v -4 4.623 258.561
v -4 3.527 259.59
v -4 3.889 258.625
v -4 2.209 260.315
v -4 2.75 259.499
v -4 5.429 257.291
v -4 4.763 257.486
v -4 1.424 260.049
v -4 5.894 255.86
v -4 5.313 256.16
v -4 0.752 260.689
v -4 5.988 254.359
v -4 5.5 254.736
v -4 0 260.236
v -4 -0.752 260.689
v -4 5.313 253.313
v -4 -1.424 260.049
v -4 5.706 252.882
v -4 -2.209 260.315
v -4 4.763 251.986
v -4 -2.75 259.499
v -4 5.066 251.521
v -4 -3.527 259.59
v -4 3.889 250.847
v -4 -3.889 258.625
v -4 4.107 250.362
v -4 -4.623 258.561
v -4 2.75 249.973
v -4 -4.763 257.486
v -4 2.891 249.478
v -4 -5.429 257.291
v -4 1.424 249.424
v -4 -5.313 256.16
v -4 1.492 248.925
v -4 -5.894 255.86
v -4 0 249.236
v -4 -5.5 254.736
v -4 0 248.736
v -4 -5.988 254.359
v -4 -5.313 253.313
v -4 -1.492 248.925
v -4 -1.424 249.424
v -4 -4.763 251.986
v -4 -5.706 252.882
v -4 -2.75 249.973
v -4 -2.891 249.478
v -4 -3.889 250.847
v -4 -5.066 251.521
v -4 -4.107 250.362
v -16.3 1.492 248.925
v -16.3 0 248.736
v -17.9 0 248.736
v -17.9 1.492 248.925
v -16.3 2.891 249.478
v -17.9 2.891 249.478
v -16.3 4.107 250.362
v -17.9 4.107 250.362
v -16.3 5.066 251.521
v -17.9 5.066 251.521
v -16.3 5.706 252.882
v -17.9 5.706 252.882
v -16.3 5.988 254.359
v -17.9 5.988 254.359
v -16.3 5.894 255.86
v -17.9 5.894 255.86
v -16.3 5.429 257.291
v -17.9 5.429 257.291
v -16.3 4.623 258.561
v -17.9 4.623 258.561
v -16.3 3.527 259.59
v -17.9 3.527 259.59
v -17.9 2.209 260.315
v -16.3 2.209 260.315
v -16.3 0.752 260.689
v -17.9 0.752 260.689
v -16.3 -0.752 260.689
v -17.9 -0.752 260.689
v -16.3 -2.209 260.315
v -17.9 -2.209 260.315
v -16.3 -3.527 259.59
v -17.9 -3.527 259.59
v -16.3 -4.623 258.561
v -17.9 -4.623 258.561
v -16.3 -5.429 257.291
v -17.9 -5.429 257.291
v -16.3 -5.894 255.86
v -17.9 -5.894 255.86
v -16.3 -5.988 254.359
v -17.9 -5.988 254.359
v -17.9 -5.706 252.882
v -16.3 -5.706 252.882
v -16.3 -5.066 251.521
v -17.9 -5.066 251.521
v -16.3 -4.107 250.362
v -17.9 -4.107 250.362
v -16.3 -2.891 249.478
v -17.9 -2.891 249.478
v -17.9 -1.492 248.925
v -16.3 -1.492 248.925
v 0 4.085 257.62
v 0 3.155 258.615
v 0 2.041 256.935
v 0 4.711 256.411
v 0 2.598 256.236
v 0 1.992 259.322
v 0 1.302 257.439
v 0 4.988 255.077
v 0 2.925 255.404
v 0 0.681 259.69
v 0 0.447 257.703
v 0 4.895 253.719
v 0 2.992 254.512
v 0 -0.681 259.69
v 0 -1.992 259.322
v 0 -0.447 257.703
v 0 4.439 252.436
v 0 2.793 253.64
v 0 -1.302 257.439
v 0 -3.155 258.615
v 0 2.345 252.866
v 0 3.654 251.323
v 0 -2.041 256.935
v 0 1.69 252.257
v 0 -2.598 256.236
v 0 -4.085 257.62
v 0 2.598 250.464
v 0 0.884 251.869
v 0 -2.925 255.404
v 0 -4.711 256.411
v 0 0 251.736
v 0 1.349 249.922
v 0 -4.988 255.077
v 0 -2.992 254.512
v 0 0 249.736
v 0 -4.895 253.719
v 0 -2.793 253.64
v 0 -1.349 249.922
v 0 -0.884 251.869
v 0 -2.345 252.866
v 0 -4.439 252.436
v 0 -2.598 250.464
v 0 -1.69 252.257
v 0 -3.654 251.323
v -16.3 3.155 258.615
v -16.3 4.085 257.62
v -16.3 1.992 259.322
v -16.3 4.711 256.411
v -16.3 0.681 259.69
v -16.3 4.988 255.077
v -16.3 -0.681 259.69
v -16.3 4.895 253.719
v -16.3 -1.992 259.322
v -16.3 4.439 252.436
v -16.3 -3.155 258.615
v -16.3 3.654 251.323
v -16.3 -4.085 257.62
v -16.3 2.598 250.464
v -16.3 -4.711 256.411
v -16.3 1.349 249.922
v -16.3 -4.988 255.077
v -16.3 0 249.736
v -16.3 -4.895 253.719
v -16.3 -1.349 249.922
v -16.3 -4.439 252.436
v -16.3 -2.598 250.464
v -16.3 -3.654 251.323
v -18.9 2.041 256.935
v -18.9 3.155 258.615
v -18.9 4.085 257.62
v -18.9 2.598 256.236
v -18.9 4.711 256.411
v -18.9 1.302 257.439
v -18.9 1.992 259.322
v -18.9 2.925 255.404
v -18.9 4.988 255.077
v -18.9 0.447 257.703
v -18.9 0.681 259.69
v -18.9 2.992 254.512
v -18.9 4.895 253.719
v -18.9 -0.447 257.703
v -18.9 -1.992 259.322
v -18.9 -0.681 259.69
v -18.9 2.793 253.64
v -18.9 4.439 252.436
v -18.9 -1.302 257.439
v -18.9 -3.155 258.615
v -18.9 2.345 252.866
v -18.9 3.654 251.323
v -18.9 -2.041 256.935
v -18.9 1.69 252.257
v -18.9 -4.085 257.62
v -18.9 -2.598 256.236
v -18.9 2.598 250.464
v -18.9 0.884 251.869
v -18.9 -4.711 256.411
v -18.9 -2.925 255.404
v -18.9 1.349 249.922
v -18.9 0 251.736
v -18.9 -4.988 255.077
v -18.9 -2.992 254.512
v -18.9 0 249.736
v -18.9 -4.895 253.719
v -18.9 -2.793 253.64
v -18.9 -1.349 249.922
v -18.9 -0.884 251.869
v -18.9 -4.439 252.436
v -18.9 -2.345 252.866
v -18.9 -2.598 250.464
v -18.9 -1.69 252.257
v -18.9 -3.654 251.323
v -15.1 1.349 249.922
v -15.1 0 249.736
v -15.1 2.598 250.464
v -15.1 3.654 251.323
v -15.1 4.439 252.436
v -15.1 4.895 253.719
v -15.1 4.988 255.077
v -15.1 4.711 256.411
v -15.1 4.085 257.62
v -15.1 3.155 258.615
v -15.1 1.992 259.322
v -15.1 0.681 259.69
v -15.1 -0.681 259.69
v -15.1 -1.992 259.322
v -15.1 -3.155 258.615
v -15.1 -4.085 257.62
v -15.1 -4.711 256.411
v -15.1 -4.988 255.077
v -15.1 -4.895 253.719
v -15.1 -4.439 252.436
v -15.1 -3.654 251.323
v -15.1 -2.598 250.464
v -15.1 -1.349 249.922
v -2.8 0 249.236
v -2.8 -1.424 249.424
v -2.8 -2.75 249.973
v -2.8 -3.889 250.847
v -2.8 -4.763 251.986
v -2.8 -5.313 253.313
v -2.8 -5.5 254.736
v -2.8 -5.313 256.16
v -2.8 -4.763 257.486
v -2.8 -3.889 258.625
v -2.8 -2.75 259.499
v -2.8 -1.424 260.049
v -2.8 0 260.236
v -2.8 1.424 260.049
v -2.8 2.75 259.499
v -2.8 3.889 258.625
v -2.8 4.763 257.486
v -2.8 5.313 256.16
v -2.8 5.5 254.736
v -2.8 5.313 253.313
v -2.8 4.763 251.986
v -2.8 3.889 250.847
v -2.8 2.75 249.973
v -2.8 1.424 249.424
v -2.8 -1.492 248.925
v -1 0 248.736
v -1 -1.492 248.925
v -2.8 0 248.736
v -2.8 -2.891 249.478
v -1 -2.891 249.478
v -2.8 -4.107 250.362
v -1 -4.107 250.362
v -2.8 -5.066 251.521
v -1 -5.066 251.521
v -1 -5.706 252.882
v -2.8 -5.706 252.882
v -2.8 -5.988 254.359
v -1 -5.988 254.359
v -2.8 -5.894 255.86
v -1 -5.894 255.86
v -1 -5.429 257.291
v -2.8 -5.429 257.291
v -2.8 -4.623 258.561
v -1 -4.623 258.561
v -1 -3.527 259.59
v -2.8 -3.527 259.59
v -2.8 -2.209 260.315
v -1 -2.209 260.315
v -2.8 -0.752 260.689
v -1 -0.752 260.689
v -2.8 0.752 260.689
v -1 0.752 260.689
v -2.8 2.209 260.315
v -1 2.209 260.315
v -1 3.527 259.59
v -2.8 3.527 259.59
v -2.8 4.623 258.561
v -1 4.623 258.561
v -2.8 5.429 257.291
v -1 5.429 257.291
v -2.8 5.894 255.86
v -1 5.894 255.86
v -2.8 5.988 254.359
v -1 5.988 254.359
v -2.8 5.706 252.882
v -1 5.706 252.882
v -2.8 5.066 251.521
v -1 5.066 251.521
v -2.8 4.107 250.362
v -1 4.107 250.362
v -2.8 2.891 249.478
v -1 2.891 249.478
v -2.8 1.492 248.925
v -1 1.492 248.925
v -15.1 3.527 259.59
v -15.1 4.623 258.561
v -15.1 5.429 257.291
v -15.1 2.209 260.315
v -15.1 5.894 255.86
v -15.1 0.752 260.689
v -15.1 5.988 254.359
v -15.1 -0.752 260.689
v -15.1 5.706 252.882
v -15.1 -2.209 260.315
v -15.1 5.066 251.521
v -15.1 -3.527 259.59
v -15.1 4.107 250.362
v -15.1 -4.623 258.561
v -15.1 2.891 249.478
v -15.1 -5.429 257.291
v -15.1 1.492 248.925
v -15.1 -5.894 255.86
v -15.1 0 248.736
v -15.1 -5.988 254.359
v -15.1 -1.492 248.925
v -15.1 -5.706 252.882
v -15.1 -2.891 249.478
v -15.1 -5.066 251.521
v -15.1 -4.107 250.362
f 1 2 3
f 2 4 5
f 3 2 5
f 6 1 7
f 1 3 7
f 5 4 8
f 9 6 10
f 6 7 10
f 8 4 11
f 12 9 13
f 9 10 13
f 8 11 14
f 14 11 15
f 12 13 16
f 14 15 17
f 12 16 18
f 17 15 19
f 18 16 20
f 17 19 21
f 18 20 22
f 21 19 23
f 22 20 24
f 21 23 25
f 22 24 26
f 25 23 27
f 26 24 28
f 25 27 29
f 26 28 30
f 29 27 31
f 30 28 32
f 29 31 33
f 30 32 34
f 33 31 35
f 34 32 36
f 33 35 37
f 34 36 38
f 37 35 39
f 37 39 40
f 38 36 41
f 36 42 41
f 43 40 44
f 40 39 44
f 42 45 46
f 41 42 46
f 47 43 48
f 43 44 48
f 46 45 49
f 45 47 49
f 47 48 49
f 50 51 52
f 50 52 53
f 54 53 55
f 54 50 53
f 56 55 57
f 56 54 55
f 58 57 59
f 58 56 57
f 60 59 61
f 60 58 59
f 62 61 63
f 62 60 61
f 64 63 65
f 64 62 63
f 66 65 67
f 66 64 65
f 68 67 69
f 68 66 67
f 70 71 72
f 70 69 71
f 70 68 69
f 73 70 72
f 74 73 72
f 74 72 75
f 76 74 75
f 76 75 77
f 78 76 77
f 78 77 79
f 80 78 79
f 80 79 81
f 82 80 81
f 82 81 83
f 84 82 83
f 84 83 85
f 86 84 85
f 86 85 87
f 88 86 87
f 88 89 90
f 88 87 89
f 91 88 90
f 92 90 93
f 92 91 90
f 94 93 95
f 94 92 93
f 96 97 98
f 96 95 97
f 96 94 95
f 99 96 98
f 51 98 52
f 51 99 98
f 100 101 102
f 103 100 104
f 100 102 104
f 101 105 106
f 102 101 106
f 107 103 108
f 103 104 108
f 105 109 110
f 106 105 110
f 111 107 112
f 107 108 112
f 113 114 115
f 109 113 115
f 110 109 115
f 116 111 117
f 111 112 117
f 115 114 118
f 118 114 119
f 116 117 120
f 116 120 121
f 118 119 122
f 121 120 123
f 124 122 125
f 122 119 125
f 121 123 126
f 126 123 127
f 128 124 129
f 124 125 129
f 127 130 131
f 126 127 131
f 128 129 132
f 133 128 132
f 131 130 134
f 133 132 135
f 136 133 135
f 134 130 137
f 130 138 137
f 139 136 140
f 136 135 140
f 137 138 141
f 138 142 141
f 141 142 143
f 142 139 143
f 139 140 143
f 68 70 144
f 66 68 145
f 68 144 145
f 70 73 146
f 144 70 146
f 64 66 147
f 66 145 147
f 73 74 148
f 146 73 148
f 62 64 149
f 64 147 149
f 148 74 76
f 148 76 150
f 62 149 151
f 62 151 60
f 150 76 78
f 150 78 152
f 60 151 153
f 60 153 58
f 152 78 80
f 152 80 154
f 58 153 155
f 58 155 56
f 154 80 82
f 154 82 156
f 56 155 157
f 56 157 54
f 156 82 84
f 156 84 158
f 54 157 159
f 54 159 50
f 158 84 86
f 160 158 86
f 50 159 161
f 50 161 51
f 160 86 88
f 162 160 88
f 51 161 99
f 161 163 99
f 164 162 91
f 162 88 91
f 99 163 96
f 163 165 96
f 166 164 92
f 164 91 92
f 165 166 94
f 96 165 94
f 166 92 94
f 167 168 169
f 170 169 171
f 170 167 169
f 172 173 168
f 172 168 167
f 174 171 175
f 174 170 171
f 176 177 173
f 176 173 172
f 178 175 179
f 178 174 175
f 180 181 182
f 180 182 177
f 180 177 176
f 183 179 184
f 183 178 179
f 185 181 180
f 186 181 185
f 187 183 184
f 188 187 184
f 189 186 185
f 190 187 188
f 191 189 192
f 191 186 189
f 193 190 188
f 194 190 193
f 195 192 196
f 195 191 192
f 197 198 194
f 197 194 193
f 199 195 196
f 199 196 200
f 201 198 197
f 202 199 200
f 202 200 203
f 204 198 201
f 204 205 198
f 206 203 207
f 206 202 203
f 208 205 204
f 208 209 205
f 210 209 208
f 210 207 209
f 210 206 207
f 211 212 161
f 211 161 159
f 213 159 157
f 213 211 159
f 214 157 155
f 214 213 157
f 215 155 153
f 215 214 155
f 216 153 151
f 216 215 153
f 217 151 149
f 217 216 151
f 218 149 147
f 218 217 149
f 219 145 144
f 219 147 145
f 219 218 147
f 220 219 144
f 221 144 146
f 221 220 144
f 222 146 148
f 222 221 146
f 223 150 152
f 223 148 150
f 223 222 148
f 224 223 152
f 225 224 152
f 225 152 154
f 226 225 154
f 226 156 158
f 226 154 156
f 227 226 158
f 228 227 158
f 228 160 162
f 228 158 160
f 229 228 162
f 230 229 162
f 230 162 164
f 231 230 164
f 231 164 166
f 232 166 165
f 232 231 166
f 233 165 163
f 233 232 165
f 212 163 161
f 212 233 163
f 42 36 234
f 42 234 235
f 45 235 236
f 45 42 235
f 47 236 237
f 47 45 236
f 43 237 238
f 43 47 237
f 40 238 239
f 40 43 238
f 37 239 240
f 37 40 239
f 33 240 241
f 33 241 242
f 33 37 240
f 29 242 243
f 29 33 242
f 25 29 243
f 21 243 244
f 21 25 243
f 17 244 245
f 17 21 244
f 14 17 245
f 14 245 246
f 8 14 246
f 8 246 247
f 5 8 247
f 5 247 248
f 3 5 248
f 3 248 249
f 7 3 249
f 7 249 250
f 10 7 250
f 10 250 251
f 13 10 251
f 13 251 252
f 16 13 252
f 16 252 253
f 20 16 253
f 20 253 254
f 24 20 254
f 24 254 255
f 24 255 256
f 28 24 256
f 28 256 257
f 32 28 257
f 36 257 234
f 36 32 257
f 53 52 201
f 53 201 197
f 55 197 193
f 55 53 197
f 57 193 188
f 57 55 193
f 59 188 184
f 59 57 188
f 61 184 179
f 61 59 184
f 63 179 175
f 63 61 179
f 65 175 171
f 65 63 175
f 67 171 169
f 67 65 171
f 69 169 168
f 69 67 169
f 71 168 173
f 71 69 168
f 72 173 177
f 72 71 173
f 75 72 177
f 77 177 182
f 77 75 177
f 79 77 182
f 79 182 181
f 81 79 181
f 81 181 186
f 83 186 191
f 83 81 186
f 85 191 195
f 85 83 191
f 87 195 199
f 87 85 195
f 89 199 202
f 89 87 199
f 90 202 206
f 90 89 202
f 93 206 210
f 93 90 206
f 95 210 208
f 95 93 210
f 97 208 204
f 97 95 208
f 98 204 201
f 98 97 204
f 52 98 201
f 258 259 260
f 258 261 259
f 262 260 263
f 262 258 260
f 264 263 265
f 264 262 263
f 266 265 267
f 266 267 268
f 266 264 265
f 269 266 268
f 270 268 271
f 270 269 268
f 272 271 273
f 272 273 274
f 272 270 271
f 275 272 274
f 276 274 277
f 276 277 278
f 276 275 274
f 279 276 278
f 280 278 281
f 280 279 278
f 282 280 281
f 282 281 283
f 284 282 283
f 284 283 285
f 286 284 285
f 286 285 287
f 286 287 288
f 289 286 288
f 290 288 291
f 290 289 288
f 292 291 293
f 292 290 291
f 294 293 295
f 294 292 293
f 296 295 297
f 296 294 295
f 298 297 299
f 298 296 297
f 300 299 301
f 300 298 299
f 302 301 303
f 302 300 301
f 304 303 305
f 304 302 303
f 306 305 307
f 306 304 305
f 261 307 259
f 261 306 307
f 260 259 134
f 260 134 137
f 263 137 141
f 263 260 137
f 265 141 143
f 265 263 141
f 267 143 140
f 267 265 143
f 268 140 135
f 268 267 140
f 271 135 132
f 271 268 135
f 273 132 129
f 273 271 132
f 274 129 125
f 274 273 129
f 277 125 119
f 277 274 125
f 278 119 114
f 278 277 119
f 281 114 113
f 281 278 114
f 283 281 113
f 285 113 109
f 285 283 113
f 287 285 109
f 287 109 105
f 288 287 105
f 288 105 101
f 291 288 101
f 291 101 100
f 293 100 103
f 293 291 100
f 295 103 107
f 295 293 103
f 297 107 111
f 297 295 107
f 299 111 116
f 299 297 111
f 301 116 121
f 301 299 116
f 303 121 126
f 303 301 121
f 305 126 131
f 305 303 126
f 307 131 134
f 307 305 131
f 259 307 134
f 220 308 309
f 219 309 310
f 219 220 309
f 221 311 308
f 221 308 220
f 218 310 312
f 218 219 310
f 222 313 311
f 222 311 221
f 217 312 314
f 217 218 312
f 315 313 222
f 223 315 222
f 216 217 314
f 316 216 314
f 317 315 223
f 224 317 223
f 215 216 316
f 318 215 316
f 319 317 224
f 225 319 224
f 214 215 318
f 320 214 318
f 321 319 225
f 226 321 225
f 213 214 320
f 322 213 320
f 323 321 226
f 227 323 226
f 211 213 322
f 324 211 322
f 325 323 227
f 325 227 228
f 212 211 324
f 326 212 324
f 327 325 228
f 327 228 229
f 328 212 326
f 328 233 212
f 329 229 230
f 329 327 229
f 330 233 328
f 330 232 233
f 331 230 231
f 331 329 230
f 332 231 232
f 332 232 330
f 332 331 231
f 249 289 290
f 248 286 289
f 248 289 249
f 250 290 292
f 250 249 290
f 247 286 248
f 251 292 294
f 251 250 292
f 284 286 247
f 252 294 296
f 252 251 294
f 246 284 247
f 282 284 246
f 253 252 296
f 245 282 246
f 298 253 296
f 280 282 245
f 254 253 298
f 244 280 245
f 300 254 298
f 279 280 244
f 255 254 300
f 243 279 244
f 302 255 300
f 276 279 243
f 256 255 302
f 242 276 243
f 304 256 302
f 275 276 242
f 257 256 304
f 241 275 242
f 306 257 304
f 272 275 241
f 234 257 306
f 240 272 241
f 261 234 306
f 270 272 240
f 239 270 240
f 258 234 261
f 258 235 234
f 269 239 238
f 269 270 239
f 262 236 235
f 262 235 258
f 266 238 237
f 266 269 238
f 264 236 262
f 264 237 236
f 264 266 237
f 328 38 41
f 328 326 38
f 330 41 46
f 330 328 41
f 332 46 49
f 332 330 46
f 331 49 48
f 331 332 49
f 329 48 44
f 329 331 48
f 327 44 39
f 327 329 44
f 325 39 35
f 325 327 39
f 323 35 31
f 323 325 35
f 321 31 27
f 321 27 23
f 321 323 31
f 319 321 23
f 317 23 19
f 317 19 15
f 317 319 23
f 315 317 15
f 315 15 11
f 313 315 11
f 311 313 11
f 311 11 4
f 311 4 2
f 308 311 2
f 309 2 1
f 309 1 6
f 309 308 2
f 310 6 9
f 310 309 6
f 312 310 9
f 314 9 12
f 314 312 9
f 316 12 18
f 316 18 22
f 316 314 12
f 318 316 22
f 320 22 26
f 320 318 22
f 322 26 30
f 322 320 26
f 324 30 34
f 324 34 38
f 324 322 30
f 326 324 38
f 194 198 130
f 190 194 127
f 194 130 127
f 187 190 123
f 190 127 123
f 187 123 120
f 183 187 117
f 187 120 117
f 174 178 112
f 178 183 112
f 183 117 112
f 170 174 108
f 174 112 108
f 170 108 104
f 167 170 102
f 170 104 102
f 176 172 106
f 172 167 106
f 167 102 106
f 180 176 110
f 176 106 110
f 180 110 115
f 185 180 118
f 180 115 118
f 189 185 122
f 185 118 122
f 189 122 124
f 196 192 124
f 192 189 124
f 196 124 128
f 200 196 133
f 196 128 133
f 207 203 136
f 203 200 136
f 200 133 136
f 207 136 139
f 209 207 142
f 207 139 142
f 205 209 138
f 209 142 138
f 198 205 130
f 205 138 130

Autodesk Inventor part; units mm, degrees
ref_plane "YZ Plane" through (0, 0, 0) normal (1, 0, 0) x (0, 1, 0)
ref_plane "XZ Plane" through (0, 0, 0) normal (0, 1, 0) x (-1, 0, 0)
ref_plane "XY Plane" through (0, 0, 0) normal (0, 0, 1) x (1, 0, 0)
sketch "Sketch1" plane through (0, 0, 0) normal (0, 1, 0) x (-1, 0, 0)
  line L0 (0, 254.7362) -> (18.9, 254.7362)
  line L1 (0, 254.7362) -> (18.9, 254.7362) construction
  line L2 (18.9, 254.7362) -> (18.9, 248.7362)
  line L3 (18.9, 248.7362) -> (16.3, 248.7362)
  line L4 (16.3, 248.7362) -> (16.3, 249.7362)
  line L5 (16.3, 249.7362) -> (15.1, 249.7362)
  line L6 (15.1, 249.7362) -> (15.1, 248.7362)
  line L7 (0, 254.7362) -> (0, 248.7362)
  line L8 (0, 248.7362) -> (2.8, 248.7362)
  line L9 (2.8, 248.7362) -> (2.8, 249.2362)
  line L10 (2.8, 249.2362) -> (4, 249.2362)
  line L11 (4, 249.2362) -> (4, 248.7362)
  line L12 (4, 248.7362) -> (15.1, 248.7362)
  line L13 (18.9, 251.7362) -> (0, 251.7362)
  point P0 (0, 0)
  dimension "d0" = 18.9
  dimension "d1" = 0
  dimension "d2" = 6
  dimension "d3" = 2.6
  dimension "d4" = 1
  dimension "d5" = 1.2
  dimension "d6" = 2.8
  dimension "d7" = 1.2
  dimension "d8" = 3
revolve "Revolution1" add sketch "Sketch1" angle 360 about axis through (0, 0, 254.7362) along (-1, 0, 0) contours L13 L2 L3 L4 L5 L6 L12 L11 L10 L9 L8 L7
chamfer "Chamfer1" distance 1 angle 45 2 edges at (0, 0, 260.7362) (-18.9, 0, 260.7362)
ref_plane "Work Plane1" through (-9.45, 0, 254.7362) normal (-1, 0, 0) x (0, 0, 1)
ref_plane "Work Plane2" through (-27.2784, -18.1924, 229.4682) normal (0, -0.3925, 0.9198) x (1, 0, 0)
ref_plane "Work Plane3" through (-73.6784, -43.0389, 250.2867) normal (0, -0.9198, -0.3925) x (1, 0, 0)
properties part number "00_IGUS_Drylin_RJ4JP-01-06"
